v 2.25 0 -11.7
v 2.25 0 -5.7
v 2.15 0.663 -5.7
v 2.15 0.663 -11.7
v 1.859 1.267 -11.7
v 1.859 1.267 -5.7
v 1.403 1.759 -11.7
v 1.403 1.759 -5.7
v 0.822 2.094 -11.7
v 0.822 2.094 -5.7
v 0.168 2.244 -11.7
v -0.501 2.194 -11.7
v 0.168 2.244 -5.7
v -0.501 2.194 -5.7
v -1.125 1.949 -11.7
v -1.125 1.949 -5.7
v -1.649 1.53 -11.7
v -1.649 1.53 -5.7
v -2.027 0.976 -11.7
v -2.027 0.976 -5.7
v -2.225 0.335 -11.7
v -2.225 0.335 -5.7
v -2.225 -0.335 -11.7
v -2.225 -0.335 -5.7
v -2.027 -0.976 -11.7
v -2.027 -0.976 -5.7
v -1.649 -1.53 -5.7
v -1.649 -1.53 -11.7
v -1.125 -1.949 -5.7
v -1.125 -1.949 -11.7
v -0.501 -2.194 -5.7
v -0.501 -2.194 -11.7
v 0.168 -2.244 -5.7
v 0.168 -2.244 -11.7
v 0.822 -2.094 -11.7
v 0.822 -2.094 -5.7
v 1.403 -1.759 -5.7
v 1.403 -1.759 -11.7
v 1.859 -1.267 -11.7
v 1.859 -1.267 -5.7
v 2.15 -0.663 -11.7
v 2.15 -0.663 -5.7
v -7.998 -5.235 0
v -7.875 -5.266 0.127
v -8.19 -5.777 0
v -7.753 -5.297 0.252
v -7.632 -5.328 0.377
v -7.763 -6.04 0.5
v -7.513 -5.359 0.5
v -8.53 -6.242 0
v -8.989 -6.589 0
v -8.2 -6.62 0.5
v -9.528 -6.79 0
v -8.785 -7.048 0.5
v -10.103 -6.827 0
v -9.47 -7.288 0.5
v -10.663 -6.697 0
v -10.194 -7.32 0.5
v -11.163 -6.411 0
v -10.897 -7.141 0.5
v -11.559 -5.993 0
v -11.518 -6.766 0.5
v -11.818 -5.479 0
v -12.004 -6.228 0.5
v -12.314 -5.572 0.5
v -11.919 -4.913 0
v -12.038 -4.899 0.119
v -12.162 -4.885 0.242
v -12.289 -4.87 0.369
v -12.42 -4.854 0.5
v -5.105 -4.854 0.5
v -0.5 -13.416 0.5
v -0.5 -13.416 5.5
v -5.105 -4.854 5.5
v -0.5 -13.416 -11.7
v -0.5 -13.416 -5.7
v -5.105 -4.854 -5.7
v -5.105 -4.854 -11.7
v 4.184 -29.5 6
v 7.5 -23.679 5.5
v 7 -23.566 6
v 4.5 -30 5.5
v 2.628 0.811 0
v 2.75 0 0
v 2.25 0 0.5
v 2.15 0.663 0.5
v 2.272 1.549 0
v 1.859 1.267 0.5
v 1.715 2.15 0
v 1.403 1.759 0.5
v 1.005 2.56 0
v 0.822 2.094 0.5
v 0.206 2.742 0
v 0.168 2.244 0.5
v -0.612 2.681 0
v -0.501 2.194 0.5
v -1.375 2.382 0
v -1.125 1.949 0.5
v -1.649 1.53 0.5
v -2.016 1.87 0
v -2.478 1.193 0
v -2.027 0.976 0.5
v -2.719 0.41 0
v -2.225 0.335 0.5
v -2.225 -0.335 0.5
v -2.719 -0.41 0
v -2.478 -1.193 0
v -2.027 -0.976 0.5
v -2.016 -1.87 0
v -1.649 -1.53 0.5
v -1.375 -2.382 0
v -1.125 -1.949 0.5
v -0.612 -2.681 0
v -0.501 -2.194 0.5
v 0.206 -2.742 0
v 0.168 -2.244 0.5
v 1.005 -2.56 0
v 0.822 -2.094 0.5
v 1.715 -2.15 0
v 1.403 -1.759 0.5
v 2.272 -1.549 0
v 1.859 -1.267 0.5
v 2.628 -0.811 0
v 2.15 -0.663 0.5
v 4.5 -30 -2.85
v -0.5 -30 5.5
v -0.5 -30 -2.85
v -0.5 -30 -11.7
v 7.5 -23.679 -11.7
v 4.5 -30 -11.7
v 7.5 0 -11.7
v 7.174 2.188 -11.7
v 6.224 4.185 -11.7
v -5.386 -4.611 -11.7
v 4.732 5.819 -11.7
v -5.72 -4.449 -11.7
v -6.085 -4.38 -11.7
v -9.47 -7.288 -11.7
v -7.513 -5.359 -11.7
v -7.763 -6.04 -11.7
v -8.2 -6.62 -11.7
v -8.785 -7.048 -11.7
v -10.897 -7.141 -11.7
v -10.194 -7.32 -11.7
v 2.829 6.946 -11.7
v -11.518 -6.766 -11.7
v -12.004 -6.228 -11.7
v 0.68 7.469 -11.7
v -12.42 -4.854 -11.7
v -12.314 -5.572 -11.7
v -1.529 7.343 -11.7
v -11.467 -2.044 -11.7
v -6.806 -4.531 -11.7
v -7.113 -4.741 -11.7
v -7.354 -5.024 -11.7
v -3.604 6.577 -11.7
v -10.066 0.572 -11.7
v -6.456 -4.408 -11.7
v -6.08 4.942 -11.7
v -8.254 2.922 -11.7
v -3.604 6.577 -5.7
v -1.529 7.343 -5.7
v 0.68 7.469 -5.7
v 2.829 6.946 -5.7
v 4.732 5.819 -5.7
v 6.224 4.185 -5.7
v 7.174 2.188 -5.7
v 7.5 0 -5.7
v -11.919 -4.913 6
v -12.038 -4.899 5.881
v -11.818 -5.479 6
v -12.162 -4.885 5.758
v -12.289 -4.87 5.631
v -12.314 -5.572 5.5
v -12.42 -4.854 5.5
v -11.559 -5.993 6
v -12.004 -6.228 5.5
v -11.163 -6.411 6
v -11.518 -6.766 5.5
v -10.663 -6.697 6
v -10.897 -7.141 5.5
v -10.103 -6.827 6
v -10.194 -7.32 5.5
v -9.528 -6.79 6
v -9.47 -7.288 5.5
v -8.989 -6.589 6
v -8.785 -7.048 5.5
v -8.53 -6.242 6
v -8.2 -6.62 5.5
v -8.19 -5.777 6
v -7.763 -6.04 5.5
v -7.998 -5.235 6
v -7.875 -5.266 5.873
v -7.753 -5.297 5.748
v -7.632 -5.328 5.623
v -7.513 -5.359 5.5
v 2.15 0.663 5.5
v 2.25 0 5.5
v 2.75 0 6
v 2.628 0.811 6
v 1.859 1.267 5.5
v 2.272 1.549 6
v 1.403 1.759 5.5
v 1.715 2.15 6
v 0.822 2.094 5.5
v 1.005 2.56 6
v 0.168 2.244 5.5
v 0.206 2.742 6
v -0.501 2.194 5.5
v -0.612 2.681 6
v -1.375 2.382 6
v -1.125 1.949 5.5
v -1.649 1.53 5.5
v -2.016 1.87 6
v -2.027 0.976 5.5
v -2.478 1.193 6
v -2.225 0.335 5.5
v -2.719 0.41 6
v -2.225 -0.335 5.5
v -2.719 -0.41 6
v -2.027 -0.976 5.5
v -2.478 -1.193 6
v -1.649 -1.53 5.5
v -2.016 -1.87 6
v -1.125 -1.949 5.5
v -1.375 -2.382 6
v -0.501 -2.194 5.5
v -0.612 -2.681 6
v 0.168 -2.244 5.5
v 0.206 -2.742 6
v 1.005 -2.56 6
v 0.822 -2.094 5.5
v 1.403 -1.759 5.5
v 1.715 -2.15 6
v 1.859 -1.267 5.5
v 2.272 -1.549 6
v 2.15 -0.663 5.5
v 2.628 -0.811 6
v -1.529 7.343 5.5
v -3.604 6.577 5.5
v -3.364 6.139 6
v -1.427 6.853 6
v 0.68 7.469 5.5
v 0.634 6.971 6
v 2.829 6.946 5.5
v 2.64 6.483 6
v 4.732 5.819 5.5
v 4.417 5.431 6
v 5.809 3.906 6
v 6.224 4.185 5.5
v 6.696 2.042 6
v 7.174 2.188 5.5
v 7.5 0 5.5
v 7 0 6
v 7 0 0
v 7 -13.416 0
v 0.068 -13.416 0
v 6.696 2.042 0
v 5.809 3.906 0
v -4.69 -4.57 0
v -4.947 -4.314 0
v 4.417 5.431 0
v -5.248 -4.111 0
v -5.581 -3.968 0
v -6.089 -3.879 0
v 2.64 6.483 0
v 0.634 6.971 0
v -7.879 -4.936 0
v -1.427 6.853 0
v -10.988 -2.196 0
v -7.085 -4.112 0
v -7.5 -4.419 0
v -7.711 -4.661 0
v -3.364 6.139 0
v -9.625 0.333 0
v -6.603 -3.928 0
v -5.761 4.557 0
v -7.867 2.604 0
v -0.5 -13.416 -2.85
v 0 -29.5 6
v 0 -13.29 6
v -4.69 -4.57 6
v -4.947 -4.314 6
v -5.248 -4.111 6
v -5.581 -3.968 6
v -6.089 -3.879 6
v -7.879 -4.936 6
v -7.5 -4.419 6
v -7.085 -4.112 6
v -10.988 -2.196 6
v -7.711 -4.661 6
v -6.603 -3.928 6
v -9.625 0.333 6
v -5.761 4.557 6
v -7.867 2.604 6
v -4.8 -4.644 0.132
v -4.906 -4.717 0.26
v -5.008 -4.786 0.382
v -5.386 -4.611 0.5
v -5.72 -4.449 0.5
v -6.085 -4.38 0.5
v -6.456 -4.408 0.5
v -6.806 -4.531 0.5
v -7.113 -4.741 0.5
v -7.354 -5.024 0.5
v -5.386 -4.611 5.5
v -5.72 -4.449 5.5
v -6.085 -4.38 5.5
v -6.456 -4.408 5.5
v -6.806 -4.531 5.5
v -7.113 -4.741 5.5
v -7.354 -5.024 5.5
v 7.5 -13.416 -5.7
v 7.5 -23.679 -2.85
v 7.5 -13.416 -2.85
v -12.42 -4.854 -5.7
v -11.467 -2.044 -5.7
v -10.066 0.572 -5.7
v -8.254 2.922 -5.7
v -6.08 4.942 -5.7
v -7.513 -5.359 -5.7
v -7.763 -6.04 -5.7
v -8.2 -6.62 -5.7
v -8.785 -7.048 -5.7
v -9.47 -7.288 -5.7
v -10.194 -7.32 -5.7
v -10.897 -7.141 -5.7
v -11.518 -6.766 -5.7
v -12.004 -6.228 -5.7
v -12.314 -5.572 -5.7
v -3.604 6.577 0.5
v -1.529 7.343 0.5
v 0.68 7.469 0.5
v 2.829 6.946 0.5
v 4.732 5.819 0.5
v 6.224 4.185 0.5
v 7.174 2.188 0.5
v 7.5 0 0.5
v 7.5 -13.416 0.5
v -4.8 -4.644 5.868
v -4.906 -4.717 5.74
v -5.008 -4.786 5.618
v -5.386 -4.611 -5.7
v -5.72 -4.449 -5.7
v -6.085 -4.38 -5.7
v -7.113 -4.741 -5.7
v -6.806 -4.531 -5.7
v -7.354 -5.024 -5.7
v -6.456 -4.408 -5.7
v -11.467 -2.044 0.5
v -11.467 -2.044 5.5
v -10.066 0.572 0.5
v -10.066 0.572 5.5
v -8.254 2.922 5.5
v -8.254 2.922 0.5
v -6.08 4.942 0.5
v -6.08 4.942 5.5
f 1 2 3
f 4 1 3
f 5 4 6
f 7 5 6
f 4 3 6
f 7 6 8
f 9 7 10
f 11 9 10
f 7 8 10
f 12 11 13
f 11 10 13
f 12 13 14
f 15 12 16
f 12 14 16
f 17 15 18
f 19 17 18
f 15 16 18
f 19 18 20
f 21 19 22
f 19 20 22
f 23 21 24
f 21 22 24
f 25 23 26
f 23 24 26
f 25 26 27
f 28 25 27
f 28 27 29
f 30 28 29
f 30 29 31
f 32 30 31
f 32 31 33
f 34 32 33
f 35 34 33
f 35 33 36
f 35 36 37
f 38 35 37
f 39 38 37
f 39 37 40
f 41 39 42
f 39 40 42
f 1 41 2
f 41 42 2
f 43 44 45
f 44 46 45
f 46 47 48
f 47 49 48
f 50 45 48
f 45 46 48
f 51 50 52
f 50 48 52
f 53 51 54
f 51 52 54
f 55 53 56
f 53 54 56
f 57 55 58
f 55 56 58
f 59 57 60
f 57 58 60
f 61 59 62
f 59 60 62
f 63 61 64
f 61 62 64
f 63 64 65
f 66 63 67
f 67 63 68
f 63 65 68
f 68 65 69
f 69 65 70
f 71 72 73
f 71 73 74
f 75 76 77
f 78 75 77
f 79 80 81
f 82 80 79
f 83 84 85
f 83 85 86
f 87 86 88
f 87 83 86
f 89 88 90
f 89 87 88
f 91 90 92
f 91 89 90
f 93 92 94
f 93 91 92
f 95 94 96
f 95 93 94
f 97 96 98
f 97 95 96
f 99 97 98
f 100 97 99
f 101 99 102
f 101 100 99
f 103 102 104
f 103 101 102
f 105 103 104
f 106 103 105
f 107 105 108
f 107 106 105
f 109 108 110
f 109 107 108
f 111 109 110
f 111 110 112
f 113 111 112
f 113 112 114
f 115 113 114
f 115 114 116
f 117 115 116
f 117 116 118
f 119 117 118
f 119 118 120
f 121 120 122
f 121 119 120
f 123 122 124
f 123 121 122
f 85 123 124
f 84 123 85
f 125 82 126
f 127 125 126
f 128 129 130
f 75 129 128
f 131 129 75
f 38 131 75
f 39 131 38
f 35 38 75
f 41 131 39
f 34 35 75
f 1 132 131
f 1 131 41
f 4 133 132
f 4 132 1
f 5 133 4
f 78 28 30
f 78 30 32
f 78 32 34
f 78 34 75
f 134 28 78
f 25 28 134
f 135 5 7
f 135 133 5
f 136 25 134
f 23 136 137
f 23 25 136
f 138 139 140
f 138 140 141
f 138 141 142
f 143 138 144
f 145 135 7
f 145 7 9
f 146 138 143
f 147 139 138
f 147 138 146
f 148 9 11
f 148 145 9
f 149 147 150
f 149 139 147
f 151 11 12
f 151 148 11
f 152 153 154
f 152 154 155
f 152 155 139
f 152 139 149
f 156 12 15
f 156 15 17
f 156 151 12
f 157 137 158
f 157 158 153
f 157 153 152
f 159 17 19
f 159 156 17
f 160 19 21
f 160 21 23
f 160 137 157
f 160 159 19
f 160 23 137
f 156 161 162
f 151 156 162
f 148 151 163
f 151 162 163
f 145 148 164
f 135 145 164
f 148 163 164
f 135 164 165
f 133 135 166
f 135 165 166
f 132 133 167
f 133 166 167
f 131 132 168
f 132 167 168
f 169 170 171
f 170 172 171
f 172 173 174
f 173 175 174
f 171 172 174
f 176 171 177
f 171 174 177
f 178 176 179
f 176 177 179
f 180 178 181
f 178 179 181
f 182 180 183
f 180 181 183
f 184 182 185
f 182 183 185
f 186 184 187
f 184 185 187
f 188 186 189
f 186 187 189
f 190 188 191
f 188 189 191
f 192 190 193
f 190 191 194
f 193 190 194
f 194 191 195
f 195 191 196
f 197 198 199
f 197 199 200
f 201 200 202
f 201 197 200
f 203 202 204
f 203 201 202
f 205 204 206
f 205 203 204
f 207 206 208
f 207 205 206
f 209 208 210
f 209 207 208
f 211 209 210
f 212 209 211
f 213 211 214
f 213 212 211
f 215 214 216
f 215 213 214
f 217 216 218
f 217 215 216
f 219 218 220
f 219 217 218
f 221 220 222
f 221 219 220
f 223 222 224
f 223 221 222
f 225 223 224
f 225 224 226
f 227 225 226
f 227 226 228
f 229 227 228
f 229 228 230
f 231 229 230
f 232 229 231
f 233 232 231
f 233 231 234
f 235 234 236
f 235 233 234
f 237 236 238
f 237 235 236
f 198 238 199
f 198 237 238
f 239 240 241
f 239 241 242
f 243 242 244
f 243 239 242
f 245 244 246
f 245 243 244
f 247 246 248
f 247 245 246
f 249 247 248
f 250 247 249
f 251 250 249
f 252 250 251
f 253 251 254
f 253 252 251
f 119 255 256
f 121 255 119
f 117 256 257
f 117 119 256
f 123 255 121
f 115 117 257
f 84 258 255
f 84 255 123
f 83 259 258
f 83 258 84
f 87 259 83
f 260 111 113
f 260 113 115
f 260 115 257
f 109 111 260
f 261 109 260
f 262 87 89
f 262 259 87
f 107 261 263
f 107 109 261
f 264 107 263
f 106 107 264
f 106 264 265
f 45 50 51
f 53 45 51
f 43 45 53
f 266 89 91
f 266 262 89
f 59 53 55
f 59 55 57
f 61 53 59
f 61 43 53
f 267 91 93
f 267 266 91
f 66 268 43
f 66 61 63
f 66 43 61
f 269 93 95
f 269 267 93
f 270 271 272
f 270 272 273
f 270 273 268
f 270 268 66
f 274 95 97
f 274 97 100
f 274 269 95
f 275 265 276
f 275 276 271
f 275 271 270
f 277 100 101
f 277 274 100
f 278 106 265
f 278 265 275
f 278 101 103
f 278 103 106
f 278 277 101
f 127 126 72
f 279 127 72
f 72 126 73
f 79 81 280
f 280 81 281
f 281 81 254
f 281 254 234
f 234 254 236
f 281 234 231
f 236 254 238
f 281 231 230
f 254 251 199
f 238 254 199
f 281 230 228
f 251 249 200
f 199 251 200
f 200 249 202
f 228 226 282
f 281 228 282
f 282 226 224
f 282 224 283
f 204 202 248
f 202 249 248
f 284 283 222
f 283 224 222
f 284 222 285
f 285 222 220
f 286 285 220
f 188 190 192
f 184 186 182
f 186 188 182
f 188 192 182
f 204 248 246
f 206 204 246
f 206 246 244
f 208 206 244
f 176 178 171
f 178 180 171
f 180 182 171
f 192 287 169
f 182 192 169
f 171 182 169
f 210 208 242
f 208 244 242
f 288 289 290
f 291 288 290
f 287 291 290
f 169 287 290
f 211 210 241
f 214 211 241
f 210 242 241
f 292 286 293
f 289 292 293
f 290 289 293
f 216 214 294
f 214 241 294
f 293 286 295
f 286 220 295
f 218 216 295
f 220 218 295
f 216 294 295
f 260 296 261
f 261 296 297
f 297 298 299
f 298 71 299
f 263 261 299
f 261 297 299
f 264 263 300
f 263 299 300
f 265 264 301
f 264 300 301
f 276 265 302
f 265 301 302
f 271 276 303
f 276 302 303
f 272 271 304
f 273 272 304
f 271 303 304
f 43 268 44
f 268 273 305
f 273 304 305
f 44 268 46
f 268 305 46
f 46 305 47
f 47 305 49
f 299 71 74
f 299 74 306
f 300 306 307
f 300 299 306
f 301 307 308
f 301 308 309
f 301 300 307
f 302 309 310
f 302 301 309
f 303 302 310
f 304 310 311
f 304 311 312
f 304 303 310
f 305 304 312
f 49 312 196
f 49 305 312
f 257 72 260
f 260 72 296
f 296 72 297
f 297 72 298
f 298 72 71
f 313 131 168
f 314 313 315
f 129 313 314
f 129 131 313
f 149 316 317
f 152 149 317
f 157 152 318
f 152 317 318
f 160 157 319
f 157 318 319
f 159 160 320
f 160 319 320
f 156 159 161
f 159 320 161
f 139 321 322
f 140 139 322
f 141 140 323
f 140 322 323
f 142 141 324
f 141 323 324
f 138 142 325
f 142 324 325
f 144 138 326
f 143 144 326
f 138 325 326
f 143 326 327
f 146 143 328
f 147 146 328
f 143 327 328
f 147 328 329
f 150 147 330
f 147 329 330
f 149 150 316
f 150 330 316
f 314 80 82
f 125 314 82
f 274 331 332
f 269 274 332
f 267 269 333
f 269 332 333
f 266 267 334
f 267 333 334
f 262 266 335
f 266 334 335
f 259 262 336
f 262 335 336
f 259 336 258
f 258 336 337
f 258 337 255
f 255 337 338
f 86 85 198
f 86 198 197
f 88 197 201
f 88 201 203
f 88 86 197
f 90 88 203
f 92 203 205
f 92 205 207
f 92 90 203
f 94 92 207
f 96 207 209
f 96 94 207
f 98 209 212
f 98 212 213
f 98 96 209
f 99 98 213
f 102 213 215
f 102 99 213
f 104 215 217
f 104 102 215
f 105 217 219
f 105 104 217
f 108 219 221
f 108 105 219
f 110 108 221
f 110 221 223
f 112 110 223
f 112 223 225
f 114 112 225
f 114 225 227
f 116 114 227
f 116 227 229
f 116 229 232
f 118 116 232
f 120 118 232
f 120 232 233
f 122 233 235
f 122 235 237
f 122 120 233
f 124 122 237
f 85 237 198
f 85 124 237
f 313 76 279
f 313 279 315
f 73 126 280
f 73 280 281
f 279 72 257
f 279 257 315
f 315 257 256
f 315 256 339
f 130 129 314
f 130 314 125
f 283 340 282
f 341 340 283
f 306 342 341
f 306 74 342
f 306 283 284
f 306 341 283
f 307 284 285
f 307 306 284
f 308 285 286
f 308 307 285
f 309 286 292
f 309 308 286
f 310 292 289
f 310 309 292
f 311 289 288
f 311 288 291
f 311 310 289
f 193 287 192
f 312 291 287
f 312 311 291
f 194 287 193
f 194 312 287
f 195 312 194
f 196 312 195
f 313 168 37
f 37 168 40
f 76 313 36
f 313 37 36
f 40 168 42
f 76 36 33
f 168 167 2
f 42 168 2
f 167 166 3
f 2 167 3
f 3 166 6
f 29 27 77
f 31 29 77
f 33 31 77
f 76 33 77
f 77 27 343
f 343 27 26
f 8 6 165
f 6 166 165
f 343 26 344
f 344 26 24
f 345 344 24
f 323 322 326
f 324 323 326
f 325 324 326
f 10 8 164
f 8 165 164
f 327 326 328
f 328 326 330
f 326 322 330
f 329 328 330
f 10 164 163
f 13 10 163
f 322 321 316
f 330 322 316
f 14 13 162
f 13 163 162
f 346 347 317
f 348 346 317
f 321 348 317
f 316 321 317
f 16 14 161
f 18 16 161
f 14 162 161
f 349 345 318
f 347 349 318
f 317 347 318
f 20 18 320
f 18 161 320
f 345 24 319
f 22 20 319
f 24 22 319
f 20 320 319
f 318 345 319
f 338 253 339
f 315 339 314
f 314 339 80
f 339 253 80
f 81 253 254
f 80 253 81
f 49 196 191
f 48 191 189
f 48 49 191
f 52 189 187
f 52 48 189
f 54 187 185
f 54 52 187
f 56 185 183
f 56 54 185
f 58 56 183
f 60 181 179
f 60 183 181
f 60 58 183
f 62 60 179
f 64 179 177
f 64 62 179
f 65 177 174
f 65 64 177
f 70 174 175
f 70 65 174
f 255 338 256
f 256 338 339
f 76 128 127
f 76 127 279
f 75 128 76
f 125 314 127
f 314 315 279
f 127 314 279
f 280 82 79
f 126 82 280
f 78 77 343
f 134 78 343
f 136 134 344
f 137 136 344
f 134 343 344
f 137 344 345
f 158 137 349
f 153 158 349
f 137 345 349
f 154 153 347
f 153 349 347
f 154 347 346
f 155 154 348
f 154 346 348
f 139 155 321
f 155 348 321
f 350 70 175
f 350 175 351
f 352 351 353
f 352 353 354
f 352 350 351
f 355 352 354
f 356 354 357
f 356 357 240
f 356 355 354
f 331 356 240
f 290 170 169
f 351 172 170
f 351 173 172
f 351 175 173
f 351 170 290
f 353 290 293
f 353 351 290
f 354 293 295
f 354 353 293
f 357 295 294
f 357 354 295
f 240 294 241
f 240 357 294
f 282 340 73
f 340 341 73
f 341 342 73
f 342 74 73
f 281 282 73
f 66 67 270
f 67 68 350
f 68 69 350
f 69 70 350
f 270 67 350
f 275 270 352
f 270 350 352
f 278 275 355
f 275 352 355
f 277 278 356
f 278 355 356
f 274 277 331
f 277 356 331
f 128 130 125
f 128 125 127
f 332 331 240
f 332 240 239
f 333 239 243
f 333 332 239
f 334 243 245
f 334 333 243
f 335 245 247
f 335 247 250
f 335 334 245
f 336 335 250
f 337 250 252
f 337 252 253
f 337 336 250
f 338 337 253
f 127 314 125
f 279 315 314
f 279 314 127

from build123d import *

# Parameters (mm, degrees)
SKETCH1_R           = 2.25
BOSS_EXTRUDE1_DEPTH = 6
BOSS_EXTRUDE2_DEPTH = 2.85
CHAMFER1_SIZE       = 0.5
CHAMFER4_SIZE       = 0.5


with BuildPart() as part:
    # Sketch1 → Boss-Extrude1 (new body)
    with BuildSketch(Plane.XY):
        with BuildLine():
            Line((7.5, 0), (7.5, -23.678709565))
            Line((7.5, -23.678709565), (4.5, -30))
            Line((4.5, -30), (-0.5, -30))
            Line((-0.5, -30), (-0.5, -13.416407865))
            Line((-0.5, -13.416407865), (-5.105036517, -4.854116258))
            ThreePointArc((-5.105036517, -4.854116258), (-6.45581184, -4.407563939), (-7.51324337, -5.359321001))
            ThreePointArc((-7.51324337, -5.359321001), (-10.19445484, -7.320369402), (-12.419809017, -4.854116258))
            ThreePointArc((-12.419809017, -4.854116258), (-9.208102345, 1.784082351), (-3.604023267, 6.577310719))
            ThreePointArc((-3.604023267, 6.577310719), (3.822291557, 6.452913082), (7.5, 0))
        make_face()
        Circle(SKETCH1_R, mode=Mode.SUBTRACT)
    extrude(amount=BOSS_EXTRUDE1_DEPTH)

    # Sketch2 → Boss-Extrude2 (add)
    with BuildSketch(Plane(origin=(0, 0, 0), x_dir=(-1, 0, 0), z_dir=(0, 0, -1))):
        Polygon((0.5, -30), (0.5, -13.416407865), (-7.5, -13.416407865), (-7.5, -23.678709565), (-4.5, -30), align=None)
    extrude(amount=BOSS_EXTRUDE2_DEPTH)


with BuildPart() as body_2:
    # Mirror2: mirrored copy
    add(part.part.mirror(Plane(origin=(0, 0, -2.85), x_dir=(1, 0, 0), z_dir=(0, 0, -1))))


with BuildPart() as part_1:
    add(part.part)

    # Chamfer1
    chamfer1_edges = [part_1.edges().sort_by_distance(p)[0] for p in [
        (7.5, -11.839354782, 6),
        (-9.208102345, 1.784082351, 6),
        (3.822291557, 6.452913082, 6),
    ]]
    chamfer(chamfer1_edges, length=CHAMFER1_SIZE)
    chamfer1_2_edges = [part_1.edges().sort_by_distance(p)[0] for p in [
        (-2.25, 0, 6),
    ]]
    chamfer(chamfer1_2_edges, length=CHAMFER1_SIZE)
    chamfer1_3_edges = [part_1.edges().sort_by_distance(p)[0] for p in [
        (-0.5, -21.708203932, 6),
    ]]
    chamfer(chamfer1_3_edges, length=CHAMFER1_SIZE)
    chamfer1_4_edges = [part_1.edges().sort_by_distance(p)[0] for p in [
        (2.25, -30, 6),
    ]]
    chamfer(chamfer1_4_edges, length=CHAMFER1_SIZE)
    chamfer1_5_edges = [part_1.edges().sort_by_distance(p)[0] for p in [
        (-6.45581184, -4.407563939, 6),
    ]]
    chamfer(chamfer1_5_edges, length=CHAMFER1_SIZE)
    chamfer1_6_edges = [part_1.edges().sort_by_distance(p)[0] for p in [
        (-9.615213291, -7.311974374, 6),
    ]]
    chamfer(chamfer1_6_edges, length=CHAMFER1_SIZE)
    chamfer1_7_edges = [part_1.edges().sort_by_distance(p)[0] for p in [
        (5.86864666, -27.116128985, 6),
    ]]
    chamfer(chamfer1_7_edges, length=CHAMFER1_SIZE)
    chamfer1_8_edges = [part_1.edges().sort_by_distance(p)[0] for p in [
        (-2.802518259, -9.135262062, 6),
    ]]
    chamfer(chamfer1_8_edges, length=CHAMFER1_SIZE)

    # Chamfer4
    chamfer4_edges = [part_1.edges().sort_by_distance(p)[0] for p in [
        (-2.25, 0, 0),
    ]]
    chamfer(chamfer4_edges, length=CHAMFER4_SIZE)
    chamfer4_2_edges = [part_1.edges().sort_by_distance(p)[0] for p in [
        (3.822291557, 6.452913082, 0),
        (-9.208102345, 1.784082351, 0),
        (7.5, -6.708203932, 0),
    ]]
    chamfer(chamfer4_2_edges, length=CHAMFER4_SIZE)
    chamfer4_3_edges = [part_1.edges().sort_by_distance(p)[0] for p in [
        (-6.45581184, -4.407563939, 0),
    ]]
    chamfer(chamfer4_3_edges, length=CHAMFER4_SIZE)
    chamfer4_4_edges = [part_1.edges().sort_by_distance(p)[0] for p in [
        (-2.802518259, -9.135262062, 0),
    ]]
    chamfer(chamfer4_4_edges, length=CHAMFER4_SIZE)
    chamfer4_5_edges = [part_1.edges().sort_by_distance(p)[0] for p in [
        (-9.615213291, -7.311974374, 0),
    ]]
    chamfer(chamfer4_5_edges, length=CHAMFER4_SIZE)


solid = Compound([body_2.part, part_1.part])
